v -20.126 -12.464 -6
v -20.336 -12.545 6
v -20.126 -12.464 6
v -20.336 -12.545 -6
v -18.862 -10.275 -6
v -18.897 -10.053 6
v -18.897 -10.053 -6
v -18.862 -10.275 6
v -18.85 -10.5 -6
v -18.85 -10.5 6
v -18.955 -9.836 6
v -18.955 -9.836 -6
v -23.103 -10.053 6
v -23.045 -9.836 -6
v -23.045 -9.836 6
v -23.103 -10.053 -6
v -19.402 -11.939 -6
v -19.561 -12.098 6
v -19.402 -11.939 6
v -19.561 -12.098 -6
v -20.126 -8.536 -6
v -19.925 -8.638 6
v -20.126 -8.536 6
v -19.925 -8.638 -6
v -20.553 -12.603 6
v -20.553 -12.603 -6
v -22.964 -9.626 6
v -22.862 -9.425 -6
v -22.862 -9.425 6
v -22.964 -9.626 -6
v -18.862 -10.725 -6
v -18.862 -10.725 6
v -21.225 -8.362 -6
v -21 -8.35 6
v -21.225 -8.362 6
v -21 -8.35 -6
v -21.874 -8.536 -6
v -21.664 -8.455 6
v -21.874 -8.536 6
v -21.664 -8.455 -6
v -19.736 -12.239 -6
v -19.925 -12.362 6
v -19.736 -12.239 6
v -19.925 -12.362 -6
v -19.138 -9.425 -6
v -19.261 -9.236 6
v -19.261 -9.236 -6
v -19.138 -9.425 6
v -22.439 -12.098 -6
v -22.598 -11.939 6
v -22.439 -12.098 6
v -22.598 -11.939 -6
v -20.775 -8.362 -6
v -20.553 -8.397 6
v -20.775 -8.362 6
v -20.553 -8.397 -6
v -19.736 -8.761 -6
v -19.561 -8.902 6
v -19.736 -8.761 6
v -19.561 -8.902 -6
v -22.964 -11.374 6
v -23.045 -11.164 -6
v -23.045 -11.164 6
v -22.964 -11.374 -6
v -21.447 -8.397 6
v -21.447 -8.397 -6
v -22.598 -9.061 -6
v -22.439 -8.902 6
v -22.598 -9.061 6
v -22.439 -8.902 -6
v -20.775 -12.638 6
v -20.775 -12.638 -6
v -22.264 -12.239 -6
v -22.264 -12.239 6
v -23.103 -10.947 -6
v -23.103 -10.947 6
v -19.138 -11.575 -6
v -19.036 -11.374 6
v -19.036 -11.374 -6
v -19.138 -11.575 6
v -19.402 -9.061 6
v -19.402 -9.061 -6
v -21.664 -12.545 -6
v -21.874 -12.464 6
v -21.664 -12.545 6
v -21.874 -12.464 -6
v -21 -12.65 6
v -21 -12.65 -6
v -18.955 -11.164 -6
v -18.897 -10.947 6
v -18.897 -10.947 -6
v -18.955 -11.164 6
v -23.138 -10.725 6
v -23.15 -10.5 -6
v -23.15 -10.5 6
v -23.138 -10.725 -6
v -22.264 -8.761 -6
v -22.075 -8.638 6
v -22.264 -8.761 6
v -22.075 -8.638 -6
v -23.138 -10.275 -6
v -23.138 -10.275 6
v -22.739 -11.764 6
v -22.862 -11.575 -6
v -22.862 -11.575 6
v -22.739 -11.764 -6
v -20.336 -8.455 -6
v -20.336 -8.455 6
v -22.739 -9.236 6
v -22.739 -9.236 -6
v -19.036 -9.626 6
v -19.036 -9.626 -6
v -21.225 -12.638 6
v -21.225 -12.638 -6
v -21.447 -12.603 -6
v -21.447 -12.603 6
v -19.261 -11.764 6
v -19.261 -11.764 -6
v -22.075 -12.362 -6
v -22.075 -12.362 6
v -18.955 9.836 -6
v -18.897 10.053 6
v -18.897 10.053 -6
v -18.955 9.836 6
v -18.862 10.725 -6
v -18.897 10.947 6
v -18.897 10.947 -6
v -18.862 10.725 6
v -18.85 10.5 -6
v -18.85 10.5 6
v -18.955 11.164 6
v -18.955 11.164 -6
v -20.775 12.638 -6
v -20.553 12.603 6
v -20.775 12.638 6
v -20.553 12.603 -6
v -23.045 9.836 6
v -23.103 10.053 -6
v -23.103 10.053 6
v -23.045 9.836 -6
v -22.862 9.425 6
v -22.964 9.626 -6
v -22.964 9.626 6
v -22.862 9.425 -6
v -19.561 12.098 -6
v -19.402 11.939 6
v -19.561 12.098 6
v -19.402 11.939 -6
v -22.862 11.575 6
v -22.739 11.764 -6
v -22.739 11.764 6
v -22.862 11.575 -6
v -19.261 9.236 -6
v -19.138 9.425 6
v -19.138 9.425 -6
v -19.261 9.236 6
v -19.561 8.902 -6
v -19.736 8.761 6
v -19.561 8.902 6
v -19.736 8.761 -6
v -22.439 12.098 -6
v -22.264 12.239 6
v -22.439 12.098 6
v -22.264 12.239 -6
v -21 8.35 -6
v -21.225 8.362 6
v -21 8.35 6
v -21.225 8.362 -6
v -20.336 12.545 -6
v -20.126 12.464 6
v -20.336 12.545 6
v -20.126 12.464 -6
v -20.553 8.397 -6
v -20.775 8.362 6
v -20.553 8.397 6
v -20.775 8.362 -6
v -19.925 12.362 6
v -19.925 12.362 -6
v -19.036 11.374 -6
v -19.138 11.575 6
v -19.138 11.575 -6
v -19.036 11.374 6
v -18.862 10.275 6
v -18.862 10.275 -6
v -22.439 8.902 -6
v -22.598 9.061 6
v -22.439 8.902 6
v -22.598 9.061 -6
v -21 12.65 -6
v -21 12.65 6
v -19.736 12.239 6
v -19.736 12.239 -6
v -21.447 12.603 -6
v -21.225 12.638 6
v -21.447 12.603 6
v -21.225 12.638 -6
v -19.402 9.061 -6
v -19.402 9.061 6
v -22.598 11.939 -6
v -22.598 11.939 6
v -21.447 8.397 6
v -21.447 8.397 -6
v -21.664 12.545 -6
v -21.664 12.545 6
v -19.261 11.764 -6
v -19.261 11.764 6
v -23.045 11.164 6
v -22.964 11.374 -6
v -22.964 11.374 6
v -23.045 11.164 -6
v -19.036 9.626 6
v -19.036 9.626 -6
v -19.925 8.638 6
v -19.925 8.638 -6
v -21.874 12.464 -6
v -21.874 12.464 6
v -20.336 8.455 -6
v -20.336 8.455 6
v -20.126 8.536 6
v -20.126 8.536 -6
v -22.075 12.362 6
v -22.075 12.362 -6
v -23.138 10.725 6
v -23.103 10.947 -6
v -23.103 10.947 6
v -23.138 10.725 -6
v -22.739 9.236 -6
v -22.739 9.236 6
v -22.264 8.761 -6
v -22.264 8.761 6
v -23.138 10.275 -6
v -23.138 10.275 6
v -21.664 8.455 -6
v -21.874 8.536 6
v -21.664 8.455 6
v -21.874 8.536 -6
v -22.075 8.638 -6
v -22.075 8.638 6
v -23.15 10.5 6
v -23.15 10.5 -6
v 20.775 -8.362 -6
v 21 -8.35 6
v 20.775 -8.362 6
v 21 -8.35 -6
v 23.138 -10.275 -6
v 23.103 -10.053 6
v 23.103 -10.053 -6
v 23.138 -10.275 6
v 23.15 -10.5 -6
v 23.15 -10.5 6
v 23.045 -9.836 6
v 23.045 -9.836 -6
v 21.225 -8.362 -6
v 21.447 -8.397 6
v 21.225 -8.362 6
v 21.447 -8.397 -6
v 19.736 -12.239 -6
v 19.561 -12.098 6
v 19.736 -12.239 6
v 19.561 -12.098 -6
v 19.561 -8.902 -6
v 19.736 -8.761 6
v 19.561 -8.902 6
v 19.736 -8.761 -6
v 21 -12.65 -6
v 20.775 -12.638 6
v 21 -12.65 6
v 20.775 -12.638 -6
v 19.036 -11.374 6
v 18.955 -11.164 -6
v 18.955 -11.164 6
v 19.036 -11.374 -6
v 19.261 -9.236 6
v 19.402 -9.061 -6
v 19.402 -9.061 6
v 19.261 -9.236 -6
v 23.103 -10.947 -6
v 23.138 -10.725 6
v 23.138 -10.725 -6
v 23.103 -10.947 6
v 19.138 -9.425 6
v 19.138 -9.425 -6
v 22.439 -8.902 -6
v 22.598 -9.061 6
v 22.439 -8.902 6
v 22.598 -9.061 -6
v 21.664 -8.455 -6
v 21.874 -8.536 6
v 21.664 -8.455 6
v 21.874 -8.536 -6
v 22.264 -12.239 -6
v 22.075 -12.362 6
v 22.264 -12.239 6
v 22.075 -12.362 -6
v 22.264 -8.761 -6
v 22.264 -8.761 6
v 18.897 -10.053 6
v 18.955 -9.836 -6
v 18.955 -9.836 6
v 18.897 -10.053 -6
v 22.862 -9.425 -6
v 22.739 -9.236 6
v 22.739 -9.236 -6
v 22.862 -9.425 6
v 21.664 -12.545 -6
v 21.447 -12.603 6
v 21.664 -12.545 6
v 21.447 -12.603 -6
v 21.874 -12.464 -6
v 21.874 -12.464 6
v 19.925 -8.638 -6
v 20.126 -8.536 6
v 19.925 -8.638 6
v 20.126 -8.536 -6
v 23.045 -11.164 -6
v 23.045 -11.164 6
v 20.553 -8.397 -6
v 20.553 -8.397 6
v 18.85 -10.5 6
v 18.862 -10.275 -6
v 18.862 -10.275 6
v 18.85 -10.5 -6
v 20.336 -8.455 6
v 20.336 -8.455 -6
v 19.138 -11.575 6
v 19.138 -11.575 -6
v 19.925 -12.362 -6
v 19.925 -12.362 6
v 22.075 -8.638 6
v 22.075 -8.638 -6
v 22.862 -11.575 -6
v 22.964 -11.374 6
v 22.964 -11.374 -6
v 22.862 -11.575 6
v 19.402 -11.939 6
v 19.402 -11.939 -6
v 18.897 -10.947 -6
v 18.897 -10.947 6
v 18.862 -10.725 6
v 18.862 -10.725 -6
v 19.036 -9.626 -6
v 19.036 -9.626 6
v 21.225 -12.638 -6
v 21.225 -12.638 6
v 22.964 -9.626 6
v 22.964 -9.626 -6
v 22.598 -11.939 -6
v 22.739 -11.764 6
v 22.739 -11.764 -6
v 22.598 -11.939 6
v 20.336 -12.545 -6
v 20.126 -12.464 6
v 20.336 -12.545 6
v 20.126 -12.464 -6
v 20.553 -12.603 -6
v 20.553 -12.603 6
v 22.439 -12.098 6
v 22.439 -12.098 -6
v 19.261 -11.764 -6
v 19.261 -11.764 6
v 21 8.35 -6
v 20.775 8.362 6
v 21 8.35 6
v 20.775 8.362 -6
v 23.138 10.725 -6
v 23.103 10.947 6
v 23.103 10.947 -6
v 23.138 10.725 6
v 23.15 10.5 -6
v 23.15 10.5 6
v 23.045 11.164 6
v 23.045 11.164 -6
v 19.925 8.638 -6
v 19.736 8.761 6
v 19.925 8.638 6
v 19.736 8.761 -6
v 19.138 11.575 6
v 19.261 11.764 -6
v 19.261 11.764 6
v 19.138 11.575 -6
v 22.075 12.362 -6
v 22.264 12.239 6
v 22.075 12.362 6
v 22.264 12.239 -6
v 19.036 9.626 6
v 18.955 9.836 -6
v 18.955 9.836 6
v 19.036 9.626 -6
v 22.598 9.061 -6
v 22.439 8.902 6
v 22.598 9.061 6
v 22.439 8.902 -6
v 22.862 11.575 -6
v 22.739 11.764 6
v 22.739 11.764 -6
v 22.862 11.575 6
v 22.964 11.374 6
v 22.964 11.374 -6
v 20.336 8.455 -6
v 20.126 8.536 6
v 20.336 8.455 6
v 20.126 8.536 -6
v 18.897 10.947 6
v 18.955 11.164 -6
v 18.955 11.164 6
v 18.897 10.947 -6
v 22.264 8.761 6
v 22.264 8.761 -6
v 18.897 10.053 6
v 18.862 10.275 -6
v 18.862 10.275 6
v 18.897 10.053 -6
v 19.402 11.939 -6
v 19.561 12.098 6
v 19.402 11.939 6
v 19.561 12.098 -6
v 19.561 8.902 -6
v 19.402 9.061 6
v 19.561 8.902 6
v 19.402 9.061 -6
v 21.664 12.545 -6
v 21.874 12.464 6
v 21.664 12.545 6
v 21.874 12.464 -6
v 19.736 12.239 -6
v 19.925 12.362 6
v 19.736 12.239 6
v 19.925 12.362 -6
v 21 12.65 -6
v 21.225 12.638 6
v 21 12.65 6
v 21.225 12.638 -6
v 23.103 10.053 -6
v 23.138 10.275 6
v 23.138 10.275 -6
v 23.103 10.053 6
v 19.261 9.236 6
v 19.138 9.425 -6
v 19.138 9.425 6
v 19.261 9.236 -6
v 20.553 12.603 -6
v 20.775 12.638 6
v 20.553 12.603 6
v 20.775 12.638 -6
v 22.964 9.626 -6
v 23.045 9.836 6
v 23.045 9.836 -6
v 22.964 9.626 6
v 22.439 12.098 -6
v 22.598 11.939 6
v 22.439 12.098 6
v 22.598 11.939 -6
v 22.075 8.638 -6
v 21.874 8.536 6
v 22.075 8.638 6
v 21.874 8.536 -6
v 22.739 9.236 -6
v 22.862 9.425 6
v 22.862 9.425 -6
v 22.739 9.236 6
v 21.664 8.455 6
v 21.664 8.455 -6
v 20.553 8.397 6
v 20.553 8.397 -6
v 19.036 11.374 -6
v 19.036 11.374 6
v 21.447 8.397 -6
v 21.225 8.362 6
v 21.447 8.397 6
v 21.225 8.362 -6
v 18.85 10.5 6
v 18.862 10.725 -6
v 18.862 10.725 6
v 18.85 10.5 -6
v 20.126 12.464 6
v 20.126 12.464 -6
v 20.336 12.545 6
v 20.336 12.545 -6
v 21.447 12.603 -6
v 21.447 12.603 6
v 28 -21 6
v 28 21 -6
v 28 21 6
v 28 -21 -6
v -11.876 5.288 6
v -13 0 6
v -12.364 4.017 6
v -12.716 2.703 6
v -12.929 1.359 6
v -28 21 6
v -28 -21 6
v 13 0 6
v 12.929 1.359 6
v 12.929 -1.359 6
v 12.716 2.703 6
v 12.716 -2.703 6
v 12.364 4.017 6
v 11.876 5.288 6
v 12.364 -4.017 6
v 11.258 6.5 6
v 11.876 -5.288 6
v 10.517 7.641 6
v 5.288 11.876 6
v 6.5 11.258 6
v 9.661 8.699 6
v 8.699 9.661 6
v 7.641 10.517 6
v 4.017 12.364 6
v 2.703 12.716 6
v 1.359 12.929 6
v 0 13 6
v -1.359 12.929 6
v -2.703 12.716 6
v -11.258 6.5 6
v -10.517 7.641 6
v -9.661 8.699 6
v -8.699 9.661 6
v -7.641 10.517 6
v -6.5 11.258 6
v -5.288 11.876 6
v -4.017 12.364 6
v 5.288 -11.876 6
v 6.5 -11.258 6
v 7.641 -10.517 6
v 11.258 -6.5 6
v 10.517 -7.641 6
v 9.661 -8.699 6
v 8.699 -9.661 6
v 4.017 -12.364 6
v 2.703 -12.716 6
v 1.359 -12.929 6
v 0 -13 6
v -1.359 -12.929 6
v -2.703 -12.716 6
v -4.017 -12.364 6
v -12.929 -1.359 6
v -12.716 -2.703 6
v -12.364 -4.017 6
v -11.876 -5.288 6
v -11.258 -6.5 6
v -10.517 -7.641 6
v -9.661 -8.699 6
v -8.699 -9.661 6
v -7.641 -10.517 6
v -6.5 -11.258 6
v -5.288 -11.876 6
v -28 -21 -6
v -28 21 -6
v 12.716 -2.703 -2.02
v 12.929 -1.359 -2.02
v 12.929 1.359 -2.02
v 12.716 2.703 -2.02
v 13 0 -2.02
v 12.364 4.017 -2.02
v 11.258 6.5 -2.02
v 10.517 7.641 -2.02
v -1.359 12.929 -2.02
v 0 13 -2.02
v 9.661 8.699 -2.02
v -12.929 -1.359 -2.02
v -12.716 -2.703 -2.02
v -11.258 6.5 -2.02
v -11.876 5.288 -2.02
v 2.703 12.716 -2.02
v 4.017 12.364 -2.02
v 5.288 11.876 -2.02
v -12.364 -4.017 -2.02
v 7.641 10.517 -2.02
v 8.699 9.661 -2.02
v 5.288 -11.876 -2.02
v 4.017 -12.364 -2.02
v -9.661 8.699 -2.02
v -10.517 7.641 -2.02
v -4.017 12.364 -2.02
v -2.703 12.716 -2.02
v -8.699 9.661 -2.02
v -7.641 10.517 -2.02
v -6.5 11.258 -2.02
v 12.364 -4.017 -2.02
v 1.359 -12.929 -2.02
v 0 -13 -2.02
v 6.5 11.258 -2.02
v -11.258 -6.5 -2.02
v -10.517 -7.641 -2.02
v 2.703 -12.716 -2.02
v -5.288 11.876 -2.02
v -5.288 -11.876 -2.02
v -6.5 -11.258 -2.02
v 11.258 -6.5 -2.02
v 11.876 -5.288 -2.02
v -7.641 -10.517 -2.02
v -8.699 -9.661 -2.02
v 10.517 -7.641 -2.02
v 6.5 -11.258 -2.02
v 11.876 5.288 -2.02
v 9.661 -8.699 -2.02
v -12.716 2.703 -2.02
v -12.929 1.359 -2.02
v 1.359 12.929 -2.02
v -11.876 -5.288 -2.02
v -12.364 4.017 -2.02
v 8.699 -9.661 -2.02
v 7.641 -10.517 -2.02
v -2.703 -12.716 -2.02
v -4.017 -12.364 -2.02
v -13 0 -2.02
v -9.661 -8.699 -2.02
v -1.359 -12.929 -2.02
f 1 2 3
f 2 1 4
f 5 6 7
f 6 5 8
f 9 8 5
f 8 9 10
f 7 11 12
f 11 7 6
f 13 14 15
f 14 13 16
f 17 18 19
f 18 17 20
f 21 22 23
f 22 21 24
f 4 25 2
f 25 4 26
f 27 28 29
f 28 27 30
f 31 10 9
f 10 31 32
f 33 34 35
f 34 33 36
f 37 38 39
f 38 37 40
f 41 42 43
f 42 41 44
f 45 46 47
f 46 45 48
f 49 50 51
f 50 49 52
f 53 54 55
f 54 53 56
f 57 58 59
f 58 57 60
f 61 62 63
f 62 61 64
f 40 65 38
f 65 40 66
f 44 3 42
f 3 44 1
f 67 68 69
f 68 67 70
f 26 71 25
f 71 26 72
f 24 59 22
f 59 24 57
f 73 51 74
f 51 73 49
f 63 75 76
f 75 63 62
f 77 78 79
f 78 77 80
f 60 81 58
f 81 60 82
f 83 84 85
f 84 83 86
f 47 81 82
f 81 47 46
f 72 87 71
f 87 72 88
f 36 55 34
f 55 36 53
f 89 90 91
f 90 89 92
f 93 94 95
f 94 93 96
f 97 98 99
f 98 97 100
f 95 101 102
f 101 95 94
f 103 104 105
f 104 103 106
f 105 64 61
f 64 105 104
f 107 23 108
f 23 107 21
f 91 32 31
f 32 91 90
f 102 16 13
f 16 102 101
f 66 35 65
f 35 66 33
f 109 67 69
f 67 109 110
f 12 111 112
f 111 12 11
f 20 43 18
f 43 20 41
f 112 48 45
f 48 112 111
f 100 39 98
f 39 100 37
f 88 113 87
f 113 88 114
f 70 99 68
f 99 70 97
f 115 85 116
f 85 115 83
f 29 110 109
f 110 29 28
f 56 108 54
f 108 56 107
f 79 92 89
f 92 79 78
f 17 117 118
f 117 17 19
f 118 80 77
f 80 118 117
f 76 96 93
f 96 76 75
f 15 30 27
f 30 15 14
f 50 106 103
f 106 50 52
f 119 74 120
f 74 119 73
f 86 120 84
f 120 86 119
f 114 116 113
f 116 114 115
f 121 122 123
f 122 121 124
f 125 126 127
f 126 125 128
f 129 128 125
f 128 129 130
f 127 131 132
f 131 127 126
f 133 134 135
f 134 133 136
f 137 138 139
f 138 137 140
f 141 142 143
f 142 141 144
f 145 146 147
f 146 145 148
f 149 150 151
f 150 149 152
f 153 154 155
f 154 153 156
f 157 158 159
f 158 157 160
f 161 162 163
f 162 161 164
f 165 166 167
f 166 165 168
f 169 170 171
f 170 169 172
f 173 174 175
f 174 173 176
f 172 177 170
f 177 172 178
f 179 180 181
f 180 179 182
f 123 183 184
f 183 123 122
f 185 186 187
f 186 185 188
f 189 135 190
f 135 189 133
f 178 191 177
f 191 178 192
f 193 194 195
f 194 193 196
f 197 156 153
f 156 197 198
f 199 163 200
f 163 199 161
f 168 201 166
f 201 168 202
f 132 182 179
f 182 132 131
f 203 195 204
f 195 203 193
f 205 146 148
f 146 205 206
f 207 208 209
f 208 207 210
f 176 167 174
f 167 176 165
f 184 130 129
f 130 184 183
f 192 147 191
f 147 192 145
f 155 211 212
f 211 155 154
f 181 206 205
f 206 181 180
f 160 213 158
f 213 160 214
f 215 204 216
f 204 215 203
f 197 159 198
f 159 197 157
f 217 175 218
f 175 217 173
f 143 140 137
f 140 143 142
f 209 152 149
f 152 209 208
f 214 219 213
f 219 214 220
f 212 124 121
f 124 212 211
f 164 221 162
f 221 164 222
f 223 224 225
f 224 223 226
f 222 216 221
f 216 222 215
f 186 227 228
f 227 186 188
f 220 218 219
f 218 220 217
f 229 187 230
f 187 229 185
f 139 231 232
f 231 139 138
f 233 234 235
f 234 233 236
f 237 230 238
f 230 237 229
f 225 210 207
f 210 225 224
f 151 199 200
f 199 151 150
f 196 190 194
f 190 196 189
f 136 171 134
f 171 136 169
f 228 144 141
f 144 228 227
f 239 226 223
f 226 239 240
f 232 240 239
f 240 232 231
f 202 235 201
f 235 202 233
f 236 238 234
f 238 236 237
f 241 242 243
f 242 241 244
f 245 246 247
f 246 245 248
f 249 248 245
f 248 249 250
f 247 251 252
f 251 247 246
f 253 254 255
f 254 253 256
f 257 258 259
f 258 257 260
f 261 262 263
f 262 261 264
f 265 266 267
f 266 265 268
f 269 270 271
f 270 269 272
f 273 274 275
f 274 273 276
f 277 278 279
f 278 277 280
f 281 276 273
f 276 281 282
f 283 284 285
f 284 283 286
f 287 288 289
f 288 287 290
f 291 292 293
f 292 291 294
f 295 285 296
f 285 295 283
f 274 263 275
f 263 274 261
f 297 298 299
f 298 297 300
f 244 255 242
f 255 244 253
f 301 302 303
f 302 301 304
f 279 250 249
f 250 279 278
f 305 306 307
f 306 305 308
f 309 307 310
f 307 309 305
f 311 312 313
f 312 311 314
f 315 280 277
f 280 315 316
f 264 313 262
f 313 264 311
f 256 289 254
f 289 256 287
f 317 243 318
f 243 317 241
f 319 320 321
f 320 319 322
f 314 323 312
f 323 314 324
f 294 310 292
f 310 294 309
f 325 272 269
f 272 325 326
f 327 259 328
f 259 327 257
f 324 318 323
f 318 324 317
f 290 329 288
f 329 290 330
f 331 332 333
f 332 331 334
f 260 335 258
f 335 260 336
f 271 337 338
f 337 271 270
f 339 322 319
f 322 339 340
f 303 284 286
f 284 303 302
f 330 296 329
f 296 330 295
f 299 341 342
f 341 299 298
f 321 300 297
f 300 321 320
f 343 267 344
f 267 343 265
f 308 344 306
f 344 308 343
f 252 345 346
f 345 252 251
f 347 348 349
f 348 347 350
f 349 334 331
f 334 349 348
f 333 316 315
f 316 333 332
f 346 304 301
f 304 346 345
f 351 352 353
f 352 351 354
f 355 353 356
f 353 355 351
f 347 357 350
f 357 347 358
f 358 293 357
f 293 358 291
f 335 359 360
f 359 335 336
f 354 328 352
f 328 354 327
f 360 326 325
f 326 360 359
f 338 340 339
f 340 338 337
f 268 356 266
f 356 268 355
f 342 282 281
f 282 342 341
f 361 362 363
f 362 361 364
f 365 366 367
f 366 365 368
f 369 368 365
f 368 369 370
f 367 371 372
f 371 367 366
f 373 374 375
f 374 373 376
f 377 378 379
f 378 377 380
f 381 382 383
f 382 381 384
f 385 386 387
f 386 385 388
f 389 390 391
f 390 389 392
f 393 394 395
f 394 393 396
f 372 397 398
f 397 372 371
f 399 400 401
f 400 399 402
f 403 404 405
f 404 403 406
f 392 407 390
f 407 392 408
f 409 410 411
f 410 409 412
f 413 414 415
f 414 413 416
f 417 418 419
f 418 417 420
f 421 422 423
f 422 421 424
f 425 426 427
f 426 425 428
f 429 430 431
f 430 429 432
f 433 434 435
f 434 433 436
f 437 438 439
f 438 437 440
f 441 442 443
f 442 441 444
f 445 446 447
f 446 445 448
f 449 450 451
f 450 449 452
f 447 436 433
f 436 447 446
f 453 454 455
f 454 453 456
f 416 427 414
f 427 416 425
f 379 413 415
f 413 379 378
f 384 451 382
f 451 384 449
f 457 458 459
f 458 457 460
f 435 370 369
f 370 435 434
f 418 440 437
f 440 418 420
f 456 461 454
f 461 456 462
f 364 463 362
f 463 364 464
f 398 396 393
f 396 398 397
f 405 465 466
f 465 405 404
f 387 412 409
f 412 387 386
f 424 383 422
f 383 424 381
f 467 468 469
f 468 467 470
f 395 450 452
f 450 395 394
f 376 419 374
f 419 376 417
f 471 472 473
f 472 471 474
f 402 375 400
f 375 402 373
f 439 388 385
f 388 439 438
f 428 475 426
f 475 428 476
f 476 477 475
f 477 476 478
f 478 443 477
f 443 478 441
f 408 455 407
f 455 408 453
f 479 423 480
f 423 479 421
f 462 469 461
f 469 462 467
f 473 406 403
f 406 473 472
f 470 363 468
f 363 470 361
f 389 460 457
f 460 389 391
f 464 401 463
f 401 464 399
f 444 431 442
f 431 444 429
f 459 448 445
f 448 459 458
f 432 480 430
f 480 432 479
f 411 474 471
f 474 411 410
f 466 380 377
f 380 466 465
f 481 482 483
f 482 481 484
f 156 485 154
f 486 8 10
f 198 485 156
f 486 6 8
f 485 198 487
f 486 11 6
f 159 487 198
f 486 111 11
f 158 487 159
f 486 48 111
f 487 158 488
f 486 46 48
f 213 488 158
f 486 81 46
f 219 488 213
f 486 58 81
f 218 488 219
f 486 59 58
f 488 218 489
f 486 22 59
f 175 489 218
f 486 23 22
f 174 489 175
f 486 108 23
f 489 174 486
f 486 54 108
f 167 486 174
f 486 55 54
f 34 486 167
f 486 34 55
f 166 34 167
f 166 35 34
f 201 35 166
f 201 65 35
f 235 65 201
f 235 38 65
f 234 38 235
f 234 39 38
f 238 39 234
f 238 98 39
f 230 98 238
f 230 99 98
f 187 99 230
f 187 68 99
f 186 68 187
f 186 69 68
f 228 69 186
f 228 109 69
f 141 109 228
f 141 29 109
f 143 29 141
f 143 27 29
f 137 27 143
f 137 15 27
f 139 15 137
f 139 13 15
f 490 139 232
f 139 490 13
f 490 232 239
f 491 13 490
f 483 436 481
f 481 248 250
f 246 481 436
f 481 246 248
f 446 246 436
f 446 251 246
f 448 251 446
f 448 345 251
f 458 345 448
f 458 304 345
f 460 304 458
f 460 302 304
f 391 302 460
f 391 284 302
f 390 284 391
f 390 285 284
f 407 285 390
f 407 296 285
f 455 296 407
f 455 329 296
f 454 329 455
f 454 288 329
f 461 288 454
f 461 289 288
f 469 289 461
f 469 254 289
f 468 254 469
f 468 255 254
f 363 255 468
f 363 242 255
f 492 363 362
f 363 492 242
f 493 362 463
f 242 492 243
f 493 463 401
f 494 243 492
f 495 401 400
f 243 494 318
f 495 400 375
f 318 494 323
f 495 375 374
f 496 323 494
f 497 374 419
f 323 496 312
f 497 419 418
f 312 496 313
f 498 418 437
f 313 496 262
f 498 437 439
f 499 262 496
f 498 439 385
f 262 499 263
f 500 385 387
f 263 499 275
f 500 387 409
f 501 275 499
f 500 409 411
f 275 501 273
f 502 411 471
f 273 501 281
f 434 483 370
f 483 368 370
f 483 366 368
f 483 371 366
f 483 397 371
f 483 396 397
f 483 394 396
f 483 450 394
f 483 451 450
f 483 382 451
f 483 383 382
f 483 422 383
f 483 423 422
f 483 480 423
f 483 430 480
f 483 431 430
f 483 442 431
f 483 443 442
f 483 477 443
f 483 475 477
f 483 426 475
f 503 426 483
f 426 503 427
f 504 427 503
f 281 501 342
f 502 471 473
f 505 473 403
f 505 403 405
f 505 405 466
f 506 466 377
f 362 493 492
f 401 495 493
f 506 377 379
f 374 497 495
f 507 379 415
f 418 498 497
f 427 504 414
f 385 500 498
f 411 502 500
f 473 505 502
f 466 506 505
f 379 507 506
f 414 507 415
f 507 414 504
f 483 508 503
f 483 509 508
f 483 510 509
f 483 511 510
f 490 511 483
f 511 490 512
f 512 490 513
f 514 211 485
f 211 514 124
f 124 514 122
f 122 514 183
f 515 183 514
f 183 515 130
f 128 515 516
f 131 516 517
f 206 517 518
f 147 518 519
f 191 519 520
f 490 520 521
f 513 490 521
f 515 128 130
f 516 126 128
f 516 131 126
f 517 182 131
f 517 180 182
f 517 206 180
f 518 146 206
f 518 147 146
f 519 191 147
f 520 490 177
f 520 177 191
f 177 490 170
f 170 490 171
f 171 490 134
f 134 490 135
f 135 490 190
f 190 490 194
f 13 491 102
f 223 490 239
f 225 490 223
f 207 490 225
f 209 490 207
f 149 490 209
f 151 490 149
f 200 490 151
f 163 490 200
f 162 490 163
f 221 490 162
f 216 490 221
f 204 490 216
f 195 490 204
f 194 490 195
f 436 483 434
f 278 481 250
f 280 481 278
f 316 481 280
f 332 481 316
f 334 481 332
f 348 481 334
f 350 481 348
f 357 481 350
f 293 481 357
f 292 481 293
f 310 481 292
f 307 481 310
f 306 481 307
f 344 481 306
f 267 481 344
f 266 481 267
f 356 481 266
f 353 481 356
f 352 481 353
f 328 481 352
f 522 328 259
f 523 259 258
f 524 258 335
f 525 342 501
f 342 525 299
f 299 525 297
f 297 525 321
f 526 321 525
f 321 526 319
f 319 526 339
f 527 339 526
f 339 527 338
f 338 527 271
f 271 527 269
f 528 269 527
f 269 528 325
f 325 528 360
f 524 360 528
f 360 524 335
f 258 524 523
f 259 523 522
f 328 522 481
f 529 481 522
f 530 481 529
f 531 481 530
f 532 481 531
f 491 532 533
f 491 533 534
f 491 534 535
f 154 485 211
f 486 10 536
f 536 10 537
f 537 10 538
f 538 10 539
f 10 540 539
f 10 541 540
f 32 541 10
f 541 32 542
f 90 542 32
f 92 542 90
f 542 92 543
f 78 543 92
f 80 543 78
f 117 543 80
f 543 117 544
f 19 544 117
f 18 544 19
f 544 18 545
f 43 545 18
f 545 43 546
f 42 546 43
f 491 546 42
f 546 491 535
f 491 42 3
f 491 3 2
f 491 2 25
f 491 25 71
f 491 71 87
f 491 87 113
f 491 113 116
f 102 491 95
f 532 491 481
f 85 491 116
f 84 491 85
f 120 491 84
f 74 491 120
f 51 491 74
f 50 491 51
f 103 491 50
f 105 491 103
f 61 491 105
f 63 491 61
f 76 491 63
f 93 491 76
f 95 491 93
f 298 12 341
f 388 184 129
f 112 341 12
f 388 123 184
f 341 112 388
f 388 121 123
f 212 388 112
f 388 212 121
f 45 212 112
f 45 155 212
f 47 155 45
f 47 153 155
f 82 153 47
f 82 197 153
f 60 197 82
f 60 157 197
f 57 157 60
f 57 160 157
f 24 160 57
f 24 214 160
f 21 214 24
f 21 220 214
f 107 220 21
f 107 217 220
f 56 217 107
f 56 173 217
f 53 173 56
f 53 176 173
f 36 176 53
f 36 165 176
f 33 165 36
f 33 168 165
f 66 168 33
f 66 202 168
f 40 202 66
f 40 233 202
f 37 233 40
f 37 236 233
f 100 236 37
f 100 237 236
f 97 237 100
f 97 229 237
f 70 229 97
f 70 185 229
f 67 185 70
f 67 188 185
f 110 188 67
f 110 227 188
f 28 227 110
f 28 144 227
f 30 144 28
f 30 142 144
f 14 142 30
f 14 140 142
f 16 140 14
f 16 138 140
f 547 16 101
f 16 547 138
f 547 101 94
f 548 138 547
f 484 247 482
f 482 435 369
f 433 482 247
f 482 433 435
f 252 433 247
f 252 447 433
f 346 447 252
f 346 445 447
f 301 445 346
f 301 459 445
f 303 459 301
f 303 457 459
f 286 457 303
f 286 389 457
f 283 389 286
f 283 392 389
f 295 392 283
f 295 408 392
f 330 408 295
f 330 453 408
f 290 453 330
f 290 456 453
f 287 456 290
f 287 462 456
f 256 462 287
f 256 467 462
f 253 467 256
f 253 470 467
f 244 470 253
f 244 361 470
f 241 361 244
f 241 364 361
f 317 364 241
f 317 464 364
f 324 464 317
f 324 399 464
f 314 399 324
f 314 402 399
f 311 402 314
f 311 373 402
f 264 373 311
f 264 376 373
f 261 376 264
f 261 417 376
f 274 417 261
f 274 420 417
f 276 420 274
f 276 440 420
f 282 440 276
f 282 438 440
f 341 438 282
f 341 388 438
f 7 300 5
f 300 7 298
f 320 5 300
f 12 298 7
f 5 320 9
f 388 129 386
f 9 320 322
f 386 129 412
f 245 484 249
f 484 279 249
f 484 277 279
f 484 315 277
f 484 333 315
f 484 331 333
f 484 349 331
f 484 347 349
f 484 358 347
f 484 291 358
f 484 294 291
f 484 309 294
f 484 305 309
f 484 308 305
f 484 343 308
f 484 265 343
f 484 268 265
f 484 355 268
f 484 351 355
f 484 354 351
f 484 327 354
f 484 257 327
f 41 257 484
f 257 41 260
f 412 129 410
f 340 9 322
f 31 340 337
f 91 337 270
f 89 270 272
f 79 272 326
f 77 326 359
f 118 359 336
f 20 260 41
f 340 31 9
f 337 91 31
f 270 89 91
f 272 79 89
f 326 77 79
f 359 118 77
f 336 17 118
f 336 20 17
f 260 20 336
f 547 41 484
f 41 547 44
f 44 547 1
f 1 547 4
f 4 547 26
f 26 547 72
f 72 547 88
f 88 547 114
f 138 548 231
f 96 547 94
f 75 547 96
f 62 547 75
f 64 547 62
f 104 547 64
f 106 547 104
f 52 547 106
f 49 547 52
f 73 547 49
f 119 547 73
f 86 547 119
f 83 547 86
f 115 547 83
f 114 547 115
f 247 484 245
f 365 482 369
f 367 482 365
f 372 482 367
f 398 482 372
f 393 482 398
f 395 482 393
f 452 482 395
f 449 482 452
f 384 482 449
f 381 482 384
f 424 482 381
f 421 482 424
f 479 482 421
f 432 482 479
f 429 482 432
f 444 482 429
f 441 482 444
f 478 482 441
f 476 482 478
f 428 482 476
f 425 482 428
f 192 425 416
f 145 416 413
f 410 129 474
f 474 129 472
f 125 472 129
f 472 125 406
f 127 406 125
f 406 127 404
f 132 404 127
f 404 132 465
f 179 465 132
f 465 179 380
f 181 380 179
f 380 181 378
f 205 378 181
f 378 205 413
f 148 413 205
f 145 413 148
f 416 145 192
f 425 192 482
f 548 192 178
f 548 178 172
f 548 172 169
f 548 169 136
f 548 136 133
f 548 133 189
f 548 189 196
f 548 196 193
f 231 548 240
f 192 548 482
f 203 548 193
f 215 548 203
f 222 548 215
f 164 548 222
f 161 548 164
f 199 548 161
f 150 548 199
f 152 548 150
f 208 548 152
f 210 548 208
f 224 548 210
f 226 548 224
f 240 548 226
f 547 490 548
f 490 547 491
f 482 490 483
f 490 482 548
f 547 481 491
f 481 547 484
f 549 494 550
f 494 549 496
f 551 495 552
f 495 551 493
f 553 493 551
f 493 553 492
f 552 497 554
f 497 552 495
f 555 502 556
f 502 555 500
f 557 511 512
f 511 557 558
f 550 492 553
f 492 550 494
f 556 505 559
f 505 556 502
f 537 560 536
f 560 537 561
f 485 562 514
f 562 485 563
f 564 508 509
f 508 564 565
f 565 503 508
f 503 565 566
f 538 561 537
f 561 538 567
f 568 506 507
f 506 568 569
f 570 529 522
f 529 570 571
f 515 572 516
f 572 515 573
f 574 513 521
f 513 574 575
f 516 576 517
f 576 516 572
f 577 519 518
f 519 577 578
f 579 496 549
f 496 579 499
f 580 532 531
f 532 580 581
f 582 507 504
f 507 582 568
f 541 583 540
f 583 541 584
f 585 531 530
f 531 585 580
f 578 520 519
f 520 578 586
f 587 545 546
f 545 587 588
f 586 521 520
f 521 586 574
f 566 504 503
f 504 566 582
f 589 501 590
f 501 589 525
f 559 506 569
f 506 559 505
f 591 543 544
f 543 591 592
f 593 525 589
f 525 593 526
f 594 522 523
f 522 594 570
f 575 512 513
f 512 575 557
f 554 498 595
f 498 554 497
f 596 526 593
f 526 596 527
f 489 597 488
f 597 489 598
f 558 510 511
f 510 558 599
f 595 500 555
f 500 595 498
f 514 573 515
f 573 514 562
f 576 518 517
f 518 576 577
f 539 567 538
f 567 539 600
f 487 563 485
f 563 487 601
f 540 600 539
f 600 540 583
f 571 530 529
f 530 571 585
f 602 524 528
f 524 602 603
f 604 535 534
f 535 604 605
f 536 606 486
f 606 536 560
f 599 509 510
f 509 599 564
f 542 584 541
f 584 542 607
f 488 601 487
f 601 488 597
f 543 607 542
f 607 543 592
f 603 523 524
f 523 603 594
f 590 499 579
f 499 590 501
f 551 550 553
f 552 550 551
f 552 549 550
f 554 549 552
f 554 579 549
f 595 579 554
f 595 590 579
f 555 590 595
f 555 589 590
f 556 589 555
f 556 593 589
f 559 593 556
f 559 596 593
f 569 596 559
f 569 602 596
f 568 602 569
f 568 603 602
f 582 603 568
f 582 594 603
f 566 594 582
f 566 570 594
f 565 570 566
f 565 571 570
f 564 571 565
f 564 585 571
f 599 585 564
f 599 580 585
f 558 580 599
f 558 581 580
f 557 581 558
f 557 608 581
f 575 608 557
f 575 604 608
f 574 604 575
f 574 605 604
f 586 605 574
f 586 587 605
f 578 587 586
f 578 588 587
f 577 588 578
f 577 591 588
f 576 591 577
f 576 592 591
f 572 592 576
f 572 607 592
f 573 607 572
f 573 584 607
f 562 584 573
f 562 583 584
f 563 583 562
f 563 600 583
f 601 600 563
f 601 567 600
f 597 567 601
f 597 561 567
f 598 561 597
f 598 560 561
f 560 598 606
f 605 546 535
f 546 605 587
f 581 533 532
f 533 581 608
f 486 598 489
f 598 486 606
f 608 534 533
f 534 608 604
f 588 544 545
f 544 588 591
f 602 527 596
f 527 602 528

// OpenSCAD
// Lead-screw nut holder with 26 mm pocket.
$fn = 60;
eps = 0.02;
body_l = 56;
body_w = 42;
body_t = 12;
pocket_d = 26;
pocket_depth = 8;
mount_x = 21.0;
difference() {
    cube([body_l, body_w, body_t], center = true);
    translate([0, 0, body_t / 2 - pocket_depth - eps]) cylinder(d = pocket_d, h = pocket_depth + 2 * eps);
    for (x = [-mount_x, mount_x], y = [-body_w / 4, body_w / 4])
        translate([x, y, -body_t / 2 - eps]) cylinder(d = 4.3, h = body_t + 2 * eps);
}
